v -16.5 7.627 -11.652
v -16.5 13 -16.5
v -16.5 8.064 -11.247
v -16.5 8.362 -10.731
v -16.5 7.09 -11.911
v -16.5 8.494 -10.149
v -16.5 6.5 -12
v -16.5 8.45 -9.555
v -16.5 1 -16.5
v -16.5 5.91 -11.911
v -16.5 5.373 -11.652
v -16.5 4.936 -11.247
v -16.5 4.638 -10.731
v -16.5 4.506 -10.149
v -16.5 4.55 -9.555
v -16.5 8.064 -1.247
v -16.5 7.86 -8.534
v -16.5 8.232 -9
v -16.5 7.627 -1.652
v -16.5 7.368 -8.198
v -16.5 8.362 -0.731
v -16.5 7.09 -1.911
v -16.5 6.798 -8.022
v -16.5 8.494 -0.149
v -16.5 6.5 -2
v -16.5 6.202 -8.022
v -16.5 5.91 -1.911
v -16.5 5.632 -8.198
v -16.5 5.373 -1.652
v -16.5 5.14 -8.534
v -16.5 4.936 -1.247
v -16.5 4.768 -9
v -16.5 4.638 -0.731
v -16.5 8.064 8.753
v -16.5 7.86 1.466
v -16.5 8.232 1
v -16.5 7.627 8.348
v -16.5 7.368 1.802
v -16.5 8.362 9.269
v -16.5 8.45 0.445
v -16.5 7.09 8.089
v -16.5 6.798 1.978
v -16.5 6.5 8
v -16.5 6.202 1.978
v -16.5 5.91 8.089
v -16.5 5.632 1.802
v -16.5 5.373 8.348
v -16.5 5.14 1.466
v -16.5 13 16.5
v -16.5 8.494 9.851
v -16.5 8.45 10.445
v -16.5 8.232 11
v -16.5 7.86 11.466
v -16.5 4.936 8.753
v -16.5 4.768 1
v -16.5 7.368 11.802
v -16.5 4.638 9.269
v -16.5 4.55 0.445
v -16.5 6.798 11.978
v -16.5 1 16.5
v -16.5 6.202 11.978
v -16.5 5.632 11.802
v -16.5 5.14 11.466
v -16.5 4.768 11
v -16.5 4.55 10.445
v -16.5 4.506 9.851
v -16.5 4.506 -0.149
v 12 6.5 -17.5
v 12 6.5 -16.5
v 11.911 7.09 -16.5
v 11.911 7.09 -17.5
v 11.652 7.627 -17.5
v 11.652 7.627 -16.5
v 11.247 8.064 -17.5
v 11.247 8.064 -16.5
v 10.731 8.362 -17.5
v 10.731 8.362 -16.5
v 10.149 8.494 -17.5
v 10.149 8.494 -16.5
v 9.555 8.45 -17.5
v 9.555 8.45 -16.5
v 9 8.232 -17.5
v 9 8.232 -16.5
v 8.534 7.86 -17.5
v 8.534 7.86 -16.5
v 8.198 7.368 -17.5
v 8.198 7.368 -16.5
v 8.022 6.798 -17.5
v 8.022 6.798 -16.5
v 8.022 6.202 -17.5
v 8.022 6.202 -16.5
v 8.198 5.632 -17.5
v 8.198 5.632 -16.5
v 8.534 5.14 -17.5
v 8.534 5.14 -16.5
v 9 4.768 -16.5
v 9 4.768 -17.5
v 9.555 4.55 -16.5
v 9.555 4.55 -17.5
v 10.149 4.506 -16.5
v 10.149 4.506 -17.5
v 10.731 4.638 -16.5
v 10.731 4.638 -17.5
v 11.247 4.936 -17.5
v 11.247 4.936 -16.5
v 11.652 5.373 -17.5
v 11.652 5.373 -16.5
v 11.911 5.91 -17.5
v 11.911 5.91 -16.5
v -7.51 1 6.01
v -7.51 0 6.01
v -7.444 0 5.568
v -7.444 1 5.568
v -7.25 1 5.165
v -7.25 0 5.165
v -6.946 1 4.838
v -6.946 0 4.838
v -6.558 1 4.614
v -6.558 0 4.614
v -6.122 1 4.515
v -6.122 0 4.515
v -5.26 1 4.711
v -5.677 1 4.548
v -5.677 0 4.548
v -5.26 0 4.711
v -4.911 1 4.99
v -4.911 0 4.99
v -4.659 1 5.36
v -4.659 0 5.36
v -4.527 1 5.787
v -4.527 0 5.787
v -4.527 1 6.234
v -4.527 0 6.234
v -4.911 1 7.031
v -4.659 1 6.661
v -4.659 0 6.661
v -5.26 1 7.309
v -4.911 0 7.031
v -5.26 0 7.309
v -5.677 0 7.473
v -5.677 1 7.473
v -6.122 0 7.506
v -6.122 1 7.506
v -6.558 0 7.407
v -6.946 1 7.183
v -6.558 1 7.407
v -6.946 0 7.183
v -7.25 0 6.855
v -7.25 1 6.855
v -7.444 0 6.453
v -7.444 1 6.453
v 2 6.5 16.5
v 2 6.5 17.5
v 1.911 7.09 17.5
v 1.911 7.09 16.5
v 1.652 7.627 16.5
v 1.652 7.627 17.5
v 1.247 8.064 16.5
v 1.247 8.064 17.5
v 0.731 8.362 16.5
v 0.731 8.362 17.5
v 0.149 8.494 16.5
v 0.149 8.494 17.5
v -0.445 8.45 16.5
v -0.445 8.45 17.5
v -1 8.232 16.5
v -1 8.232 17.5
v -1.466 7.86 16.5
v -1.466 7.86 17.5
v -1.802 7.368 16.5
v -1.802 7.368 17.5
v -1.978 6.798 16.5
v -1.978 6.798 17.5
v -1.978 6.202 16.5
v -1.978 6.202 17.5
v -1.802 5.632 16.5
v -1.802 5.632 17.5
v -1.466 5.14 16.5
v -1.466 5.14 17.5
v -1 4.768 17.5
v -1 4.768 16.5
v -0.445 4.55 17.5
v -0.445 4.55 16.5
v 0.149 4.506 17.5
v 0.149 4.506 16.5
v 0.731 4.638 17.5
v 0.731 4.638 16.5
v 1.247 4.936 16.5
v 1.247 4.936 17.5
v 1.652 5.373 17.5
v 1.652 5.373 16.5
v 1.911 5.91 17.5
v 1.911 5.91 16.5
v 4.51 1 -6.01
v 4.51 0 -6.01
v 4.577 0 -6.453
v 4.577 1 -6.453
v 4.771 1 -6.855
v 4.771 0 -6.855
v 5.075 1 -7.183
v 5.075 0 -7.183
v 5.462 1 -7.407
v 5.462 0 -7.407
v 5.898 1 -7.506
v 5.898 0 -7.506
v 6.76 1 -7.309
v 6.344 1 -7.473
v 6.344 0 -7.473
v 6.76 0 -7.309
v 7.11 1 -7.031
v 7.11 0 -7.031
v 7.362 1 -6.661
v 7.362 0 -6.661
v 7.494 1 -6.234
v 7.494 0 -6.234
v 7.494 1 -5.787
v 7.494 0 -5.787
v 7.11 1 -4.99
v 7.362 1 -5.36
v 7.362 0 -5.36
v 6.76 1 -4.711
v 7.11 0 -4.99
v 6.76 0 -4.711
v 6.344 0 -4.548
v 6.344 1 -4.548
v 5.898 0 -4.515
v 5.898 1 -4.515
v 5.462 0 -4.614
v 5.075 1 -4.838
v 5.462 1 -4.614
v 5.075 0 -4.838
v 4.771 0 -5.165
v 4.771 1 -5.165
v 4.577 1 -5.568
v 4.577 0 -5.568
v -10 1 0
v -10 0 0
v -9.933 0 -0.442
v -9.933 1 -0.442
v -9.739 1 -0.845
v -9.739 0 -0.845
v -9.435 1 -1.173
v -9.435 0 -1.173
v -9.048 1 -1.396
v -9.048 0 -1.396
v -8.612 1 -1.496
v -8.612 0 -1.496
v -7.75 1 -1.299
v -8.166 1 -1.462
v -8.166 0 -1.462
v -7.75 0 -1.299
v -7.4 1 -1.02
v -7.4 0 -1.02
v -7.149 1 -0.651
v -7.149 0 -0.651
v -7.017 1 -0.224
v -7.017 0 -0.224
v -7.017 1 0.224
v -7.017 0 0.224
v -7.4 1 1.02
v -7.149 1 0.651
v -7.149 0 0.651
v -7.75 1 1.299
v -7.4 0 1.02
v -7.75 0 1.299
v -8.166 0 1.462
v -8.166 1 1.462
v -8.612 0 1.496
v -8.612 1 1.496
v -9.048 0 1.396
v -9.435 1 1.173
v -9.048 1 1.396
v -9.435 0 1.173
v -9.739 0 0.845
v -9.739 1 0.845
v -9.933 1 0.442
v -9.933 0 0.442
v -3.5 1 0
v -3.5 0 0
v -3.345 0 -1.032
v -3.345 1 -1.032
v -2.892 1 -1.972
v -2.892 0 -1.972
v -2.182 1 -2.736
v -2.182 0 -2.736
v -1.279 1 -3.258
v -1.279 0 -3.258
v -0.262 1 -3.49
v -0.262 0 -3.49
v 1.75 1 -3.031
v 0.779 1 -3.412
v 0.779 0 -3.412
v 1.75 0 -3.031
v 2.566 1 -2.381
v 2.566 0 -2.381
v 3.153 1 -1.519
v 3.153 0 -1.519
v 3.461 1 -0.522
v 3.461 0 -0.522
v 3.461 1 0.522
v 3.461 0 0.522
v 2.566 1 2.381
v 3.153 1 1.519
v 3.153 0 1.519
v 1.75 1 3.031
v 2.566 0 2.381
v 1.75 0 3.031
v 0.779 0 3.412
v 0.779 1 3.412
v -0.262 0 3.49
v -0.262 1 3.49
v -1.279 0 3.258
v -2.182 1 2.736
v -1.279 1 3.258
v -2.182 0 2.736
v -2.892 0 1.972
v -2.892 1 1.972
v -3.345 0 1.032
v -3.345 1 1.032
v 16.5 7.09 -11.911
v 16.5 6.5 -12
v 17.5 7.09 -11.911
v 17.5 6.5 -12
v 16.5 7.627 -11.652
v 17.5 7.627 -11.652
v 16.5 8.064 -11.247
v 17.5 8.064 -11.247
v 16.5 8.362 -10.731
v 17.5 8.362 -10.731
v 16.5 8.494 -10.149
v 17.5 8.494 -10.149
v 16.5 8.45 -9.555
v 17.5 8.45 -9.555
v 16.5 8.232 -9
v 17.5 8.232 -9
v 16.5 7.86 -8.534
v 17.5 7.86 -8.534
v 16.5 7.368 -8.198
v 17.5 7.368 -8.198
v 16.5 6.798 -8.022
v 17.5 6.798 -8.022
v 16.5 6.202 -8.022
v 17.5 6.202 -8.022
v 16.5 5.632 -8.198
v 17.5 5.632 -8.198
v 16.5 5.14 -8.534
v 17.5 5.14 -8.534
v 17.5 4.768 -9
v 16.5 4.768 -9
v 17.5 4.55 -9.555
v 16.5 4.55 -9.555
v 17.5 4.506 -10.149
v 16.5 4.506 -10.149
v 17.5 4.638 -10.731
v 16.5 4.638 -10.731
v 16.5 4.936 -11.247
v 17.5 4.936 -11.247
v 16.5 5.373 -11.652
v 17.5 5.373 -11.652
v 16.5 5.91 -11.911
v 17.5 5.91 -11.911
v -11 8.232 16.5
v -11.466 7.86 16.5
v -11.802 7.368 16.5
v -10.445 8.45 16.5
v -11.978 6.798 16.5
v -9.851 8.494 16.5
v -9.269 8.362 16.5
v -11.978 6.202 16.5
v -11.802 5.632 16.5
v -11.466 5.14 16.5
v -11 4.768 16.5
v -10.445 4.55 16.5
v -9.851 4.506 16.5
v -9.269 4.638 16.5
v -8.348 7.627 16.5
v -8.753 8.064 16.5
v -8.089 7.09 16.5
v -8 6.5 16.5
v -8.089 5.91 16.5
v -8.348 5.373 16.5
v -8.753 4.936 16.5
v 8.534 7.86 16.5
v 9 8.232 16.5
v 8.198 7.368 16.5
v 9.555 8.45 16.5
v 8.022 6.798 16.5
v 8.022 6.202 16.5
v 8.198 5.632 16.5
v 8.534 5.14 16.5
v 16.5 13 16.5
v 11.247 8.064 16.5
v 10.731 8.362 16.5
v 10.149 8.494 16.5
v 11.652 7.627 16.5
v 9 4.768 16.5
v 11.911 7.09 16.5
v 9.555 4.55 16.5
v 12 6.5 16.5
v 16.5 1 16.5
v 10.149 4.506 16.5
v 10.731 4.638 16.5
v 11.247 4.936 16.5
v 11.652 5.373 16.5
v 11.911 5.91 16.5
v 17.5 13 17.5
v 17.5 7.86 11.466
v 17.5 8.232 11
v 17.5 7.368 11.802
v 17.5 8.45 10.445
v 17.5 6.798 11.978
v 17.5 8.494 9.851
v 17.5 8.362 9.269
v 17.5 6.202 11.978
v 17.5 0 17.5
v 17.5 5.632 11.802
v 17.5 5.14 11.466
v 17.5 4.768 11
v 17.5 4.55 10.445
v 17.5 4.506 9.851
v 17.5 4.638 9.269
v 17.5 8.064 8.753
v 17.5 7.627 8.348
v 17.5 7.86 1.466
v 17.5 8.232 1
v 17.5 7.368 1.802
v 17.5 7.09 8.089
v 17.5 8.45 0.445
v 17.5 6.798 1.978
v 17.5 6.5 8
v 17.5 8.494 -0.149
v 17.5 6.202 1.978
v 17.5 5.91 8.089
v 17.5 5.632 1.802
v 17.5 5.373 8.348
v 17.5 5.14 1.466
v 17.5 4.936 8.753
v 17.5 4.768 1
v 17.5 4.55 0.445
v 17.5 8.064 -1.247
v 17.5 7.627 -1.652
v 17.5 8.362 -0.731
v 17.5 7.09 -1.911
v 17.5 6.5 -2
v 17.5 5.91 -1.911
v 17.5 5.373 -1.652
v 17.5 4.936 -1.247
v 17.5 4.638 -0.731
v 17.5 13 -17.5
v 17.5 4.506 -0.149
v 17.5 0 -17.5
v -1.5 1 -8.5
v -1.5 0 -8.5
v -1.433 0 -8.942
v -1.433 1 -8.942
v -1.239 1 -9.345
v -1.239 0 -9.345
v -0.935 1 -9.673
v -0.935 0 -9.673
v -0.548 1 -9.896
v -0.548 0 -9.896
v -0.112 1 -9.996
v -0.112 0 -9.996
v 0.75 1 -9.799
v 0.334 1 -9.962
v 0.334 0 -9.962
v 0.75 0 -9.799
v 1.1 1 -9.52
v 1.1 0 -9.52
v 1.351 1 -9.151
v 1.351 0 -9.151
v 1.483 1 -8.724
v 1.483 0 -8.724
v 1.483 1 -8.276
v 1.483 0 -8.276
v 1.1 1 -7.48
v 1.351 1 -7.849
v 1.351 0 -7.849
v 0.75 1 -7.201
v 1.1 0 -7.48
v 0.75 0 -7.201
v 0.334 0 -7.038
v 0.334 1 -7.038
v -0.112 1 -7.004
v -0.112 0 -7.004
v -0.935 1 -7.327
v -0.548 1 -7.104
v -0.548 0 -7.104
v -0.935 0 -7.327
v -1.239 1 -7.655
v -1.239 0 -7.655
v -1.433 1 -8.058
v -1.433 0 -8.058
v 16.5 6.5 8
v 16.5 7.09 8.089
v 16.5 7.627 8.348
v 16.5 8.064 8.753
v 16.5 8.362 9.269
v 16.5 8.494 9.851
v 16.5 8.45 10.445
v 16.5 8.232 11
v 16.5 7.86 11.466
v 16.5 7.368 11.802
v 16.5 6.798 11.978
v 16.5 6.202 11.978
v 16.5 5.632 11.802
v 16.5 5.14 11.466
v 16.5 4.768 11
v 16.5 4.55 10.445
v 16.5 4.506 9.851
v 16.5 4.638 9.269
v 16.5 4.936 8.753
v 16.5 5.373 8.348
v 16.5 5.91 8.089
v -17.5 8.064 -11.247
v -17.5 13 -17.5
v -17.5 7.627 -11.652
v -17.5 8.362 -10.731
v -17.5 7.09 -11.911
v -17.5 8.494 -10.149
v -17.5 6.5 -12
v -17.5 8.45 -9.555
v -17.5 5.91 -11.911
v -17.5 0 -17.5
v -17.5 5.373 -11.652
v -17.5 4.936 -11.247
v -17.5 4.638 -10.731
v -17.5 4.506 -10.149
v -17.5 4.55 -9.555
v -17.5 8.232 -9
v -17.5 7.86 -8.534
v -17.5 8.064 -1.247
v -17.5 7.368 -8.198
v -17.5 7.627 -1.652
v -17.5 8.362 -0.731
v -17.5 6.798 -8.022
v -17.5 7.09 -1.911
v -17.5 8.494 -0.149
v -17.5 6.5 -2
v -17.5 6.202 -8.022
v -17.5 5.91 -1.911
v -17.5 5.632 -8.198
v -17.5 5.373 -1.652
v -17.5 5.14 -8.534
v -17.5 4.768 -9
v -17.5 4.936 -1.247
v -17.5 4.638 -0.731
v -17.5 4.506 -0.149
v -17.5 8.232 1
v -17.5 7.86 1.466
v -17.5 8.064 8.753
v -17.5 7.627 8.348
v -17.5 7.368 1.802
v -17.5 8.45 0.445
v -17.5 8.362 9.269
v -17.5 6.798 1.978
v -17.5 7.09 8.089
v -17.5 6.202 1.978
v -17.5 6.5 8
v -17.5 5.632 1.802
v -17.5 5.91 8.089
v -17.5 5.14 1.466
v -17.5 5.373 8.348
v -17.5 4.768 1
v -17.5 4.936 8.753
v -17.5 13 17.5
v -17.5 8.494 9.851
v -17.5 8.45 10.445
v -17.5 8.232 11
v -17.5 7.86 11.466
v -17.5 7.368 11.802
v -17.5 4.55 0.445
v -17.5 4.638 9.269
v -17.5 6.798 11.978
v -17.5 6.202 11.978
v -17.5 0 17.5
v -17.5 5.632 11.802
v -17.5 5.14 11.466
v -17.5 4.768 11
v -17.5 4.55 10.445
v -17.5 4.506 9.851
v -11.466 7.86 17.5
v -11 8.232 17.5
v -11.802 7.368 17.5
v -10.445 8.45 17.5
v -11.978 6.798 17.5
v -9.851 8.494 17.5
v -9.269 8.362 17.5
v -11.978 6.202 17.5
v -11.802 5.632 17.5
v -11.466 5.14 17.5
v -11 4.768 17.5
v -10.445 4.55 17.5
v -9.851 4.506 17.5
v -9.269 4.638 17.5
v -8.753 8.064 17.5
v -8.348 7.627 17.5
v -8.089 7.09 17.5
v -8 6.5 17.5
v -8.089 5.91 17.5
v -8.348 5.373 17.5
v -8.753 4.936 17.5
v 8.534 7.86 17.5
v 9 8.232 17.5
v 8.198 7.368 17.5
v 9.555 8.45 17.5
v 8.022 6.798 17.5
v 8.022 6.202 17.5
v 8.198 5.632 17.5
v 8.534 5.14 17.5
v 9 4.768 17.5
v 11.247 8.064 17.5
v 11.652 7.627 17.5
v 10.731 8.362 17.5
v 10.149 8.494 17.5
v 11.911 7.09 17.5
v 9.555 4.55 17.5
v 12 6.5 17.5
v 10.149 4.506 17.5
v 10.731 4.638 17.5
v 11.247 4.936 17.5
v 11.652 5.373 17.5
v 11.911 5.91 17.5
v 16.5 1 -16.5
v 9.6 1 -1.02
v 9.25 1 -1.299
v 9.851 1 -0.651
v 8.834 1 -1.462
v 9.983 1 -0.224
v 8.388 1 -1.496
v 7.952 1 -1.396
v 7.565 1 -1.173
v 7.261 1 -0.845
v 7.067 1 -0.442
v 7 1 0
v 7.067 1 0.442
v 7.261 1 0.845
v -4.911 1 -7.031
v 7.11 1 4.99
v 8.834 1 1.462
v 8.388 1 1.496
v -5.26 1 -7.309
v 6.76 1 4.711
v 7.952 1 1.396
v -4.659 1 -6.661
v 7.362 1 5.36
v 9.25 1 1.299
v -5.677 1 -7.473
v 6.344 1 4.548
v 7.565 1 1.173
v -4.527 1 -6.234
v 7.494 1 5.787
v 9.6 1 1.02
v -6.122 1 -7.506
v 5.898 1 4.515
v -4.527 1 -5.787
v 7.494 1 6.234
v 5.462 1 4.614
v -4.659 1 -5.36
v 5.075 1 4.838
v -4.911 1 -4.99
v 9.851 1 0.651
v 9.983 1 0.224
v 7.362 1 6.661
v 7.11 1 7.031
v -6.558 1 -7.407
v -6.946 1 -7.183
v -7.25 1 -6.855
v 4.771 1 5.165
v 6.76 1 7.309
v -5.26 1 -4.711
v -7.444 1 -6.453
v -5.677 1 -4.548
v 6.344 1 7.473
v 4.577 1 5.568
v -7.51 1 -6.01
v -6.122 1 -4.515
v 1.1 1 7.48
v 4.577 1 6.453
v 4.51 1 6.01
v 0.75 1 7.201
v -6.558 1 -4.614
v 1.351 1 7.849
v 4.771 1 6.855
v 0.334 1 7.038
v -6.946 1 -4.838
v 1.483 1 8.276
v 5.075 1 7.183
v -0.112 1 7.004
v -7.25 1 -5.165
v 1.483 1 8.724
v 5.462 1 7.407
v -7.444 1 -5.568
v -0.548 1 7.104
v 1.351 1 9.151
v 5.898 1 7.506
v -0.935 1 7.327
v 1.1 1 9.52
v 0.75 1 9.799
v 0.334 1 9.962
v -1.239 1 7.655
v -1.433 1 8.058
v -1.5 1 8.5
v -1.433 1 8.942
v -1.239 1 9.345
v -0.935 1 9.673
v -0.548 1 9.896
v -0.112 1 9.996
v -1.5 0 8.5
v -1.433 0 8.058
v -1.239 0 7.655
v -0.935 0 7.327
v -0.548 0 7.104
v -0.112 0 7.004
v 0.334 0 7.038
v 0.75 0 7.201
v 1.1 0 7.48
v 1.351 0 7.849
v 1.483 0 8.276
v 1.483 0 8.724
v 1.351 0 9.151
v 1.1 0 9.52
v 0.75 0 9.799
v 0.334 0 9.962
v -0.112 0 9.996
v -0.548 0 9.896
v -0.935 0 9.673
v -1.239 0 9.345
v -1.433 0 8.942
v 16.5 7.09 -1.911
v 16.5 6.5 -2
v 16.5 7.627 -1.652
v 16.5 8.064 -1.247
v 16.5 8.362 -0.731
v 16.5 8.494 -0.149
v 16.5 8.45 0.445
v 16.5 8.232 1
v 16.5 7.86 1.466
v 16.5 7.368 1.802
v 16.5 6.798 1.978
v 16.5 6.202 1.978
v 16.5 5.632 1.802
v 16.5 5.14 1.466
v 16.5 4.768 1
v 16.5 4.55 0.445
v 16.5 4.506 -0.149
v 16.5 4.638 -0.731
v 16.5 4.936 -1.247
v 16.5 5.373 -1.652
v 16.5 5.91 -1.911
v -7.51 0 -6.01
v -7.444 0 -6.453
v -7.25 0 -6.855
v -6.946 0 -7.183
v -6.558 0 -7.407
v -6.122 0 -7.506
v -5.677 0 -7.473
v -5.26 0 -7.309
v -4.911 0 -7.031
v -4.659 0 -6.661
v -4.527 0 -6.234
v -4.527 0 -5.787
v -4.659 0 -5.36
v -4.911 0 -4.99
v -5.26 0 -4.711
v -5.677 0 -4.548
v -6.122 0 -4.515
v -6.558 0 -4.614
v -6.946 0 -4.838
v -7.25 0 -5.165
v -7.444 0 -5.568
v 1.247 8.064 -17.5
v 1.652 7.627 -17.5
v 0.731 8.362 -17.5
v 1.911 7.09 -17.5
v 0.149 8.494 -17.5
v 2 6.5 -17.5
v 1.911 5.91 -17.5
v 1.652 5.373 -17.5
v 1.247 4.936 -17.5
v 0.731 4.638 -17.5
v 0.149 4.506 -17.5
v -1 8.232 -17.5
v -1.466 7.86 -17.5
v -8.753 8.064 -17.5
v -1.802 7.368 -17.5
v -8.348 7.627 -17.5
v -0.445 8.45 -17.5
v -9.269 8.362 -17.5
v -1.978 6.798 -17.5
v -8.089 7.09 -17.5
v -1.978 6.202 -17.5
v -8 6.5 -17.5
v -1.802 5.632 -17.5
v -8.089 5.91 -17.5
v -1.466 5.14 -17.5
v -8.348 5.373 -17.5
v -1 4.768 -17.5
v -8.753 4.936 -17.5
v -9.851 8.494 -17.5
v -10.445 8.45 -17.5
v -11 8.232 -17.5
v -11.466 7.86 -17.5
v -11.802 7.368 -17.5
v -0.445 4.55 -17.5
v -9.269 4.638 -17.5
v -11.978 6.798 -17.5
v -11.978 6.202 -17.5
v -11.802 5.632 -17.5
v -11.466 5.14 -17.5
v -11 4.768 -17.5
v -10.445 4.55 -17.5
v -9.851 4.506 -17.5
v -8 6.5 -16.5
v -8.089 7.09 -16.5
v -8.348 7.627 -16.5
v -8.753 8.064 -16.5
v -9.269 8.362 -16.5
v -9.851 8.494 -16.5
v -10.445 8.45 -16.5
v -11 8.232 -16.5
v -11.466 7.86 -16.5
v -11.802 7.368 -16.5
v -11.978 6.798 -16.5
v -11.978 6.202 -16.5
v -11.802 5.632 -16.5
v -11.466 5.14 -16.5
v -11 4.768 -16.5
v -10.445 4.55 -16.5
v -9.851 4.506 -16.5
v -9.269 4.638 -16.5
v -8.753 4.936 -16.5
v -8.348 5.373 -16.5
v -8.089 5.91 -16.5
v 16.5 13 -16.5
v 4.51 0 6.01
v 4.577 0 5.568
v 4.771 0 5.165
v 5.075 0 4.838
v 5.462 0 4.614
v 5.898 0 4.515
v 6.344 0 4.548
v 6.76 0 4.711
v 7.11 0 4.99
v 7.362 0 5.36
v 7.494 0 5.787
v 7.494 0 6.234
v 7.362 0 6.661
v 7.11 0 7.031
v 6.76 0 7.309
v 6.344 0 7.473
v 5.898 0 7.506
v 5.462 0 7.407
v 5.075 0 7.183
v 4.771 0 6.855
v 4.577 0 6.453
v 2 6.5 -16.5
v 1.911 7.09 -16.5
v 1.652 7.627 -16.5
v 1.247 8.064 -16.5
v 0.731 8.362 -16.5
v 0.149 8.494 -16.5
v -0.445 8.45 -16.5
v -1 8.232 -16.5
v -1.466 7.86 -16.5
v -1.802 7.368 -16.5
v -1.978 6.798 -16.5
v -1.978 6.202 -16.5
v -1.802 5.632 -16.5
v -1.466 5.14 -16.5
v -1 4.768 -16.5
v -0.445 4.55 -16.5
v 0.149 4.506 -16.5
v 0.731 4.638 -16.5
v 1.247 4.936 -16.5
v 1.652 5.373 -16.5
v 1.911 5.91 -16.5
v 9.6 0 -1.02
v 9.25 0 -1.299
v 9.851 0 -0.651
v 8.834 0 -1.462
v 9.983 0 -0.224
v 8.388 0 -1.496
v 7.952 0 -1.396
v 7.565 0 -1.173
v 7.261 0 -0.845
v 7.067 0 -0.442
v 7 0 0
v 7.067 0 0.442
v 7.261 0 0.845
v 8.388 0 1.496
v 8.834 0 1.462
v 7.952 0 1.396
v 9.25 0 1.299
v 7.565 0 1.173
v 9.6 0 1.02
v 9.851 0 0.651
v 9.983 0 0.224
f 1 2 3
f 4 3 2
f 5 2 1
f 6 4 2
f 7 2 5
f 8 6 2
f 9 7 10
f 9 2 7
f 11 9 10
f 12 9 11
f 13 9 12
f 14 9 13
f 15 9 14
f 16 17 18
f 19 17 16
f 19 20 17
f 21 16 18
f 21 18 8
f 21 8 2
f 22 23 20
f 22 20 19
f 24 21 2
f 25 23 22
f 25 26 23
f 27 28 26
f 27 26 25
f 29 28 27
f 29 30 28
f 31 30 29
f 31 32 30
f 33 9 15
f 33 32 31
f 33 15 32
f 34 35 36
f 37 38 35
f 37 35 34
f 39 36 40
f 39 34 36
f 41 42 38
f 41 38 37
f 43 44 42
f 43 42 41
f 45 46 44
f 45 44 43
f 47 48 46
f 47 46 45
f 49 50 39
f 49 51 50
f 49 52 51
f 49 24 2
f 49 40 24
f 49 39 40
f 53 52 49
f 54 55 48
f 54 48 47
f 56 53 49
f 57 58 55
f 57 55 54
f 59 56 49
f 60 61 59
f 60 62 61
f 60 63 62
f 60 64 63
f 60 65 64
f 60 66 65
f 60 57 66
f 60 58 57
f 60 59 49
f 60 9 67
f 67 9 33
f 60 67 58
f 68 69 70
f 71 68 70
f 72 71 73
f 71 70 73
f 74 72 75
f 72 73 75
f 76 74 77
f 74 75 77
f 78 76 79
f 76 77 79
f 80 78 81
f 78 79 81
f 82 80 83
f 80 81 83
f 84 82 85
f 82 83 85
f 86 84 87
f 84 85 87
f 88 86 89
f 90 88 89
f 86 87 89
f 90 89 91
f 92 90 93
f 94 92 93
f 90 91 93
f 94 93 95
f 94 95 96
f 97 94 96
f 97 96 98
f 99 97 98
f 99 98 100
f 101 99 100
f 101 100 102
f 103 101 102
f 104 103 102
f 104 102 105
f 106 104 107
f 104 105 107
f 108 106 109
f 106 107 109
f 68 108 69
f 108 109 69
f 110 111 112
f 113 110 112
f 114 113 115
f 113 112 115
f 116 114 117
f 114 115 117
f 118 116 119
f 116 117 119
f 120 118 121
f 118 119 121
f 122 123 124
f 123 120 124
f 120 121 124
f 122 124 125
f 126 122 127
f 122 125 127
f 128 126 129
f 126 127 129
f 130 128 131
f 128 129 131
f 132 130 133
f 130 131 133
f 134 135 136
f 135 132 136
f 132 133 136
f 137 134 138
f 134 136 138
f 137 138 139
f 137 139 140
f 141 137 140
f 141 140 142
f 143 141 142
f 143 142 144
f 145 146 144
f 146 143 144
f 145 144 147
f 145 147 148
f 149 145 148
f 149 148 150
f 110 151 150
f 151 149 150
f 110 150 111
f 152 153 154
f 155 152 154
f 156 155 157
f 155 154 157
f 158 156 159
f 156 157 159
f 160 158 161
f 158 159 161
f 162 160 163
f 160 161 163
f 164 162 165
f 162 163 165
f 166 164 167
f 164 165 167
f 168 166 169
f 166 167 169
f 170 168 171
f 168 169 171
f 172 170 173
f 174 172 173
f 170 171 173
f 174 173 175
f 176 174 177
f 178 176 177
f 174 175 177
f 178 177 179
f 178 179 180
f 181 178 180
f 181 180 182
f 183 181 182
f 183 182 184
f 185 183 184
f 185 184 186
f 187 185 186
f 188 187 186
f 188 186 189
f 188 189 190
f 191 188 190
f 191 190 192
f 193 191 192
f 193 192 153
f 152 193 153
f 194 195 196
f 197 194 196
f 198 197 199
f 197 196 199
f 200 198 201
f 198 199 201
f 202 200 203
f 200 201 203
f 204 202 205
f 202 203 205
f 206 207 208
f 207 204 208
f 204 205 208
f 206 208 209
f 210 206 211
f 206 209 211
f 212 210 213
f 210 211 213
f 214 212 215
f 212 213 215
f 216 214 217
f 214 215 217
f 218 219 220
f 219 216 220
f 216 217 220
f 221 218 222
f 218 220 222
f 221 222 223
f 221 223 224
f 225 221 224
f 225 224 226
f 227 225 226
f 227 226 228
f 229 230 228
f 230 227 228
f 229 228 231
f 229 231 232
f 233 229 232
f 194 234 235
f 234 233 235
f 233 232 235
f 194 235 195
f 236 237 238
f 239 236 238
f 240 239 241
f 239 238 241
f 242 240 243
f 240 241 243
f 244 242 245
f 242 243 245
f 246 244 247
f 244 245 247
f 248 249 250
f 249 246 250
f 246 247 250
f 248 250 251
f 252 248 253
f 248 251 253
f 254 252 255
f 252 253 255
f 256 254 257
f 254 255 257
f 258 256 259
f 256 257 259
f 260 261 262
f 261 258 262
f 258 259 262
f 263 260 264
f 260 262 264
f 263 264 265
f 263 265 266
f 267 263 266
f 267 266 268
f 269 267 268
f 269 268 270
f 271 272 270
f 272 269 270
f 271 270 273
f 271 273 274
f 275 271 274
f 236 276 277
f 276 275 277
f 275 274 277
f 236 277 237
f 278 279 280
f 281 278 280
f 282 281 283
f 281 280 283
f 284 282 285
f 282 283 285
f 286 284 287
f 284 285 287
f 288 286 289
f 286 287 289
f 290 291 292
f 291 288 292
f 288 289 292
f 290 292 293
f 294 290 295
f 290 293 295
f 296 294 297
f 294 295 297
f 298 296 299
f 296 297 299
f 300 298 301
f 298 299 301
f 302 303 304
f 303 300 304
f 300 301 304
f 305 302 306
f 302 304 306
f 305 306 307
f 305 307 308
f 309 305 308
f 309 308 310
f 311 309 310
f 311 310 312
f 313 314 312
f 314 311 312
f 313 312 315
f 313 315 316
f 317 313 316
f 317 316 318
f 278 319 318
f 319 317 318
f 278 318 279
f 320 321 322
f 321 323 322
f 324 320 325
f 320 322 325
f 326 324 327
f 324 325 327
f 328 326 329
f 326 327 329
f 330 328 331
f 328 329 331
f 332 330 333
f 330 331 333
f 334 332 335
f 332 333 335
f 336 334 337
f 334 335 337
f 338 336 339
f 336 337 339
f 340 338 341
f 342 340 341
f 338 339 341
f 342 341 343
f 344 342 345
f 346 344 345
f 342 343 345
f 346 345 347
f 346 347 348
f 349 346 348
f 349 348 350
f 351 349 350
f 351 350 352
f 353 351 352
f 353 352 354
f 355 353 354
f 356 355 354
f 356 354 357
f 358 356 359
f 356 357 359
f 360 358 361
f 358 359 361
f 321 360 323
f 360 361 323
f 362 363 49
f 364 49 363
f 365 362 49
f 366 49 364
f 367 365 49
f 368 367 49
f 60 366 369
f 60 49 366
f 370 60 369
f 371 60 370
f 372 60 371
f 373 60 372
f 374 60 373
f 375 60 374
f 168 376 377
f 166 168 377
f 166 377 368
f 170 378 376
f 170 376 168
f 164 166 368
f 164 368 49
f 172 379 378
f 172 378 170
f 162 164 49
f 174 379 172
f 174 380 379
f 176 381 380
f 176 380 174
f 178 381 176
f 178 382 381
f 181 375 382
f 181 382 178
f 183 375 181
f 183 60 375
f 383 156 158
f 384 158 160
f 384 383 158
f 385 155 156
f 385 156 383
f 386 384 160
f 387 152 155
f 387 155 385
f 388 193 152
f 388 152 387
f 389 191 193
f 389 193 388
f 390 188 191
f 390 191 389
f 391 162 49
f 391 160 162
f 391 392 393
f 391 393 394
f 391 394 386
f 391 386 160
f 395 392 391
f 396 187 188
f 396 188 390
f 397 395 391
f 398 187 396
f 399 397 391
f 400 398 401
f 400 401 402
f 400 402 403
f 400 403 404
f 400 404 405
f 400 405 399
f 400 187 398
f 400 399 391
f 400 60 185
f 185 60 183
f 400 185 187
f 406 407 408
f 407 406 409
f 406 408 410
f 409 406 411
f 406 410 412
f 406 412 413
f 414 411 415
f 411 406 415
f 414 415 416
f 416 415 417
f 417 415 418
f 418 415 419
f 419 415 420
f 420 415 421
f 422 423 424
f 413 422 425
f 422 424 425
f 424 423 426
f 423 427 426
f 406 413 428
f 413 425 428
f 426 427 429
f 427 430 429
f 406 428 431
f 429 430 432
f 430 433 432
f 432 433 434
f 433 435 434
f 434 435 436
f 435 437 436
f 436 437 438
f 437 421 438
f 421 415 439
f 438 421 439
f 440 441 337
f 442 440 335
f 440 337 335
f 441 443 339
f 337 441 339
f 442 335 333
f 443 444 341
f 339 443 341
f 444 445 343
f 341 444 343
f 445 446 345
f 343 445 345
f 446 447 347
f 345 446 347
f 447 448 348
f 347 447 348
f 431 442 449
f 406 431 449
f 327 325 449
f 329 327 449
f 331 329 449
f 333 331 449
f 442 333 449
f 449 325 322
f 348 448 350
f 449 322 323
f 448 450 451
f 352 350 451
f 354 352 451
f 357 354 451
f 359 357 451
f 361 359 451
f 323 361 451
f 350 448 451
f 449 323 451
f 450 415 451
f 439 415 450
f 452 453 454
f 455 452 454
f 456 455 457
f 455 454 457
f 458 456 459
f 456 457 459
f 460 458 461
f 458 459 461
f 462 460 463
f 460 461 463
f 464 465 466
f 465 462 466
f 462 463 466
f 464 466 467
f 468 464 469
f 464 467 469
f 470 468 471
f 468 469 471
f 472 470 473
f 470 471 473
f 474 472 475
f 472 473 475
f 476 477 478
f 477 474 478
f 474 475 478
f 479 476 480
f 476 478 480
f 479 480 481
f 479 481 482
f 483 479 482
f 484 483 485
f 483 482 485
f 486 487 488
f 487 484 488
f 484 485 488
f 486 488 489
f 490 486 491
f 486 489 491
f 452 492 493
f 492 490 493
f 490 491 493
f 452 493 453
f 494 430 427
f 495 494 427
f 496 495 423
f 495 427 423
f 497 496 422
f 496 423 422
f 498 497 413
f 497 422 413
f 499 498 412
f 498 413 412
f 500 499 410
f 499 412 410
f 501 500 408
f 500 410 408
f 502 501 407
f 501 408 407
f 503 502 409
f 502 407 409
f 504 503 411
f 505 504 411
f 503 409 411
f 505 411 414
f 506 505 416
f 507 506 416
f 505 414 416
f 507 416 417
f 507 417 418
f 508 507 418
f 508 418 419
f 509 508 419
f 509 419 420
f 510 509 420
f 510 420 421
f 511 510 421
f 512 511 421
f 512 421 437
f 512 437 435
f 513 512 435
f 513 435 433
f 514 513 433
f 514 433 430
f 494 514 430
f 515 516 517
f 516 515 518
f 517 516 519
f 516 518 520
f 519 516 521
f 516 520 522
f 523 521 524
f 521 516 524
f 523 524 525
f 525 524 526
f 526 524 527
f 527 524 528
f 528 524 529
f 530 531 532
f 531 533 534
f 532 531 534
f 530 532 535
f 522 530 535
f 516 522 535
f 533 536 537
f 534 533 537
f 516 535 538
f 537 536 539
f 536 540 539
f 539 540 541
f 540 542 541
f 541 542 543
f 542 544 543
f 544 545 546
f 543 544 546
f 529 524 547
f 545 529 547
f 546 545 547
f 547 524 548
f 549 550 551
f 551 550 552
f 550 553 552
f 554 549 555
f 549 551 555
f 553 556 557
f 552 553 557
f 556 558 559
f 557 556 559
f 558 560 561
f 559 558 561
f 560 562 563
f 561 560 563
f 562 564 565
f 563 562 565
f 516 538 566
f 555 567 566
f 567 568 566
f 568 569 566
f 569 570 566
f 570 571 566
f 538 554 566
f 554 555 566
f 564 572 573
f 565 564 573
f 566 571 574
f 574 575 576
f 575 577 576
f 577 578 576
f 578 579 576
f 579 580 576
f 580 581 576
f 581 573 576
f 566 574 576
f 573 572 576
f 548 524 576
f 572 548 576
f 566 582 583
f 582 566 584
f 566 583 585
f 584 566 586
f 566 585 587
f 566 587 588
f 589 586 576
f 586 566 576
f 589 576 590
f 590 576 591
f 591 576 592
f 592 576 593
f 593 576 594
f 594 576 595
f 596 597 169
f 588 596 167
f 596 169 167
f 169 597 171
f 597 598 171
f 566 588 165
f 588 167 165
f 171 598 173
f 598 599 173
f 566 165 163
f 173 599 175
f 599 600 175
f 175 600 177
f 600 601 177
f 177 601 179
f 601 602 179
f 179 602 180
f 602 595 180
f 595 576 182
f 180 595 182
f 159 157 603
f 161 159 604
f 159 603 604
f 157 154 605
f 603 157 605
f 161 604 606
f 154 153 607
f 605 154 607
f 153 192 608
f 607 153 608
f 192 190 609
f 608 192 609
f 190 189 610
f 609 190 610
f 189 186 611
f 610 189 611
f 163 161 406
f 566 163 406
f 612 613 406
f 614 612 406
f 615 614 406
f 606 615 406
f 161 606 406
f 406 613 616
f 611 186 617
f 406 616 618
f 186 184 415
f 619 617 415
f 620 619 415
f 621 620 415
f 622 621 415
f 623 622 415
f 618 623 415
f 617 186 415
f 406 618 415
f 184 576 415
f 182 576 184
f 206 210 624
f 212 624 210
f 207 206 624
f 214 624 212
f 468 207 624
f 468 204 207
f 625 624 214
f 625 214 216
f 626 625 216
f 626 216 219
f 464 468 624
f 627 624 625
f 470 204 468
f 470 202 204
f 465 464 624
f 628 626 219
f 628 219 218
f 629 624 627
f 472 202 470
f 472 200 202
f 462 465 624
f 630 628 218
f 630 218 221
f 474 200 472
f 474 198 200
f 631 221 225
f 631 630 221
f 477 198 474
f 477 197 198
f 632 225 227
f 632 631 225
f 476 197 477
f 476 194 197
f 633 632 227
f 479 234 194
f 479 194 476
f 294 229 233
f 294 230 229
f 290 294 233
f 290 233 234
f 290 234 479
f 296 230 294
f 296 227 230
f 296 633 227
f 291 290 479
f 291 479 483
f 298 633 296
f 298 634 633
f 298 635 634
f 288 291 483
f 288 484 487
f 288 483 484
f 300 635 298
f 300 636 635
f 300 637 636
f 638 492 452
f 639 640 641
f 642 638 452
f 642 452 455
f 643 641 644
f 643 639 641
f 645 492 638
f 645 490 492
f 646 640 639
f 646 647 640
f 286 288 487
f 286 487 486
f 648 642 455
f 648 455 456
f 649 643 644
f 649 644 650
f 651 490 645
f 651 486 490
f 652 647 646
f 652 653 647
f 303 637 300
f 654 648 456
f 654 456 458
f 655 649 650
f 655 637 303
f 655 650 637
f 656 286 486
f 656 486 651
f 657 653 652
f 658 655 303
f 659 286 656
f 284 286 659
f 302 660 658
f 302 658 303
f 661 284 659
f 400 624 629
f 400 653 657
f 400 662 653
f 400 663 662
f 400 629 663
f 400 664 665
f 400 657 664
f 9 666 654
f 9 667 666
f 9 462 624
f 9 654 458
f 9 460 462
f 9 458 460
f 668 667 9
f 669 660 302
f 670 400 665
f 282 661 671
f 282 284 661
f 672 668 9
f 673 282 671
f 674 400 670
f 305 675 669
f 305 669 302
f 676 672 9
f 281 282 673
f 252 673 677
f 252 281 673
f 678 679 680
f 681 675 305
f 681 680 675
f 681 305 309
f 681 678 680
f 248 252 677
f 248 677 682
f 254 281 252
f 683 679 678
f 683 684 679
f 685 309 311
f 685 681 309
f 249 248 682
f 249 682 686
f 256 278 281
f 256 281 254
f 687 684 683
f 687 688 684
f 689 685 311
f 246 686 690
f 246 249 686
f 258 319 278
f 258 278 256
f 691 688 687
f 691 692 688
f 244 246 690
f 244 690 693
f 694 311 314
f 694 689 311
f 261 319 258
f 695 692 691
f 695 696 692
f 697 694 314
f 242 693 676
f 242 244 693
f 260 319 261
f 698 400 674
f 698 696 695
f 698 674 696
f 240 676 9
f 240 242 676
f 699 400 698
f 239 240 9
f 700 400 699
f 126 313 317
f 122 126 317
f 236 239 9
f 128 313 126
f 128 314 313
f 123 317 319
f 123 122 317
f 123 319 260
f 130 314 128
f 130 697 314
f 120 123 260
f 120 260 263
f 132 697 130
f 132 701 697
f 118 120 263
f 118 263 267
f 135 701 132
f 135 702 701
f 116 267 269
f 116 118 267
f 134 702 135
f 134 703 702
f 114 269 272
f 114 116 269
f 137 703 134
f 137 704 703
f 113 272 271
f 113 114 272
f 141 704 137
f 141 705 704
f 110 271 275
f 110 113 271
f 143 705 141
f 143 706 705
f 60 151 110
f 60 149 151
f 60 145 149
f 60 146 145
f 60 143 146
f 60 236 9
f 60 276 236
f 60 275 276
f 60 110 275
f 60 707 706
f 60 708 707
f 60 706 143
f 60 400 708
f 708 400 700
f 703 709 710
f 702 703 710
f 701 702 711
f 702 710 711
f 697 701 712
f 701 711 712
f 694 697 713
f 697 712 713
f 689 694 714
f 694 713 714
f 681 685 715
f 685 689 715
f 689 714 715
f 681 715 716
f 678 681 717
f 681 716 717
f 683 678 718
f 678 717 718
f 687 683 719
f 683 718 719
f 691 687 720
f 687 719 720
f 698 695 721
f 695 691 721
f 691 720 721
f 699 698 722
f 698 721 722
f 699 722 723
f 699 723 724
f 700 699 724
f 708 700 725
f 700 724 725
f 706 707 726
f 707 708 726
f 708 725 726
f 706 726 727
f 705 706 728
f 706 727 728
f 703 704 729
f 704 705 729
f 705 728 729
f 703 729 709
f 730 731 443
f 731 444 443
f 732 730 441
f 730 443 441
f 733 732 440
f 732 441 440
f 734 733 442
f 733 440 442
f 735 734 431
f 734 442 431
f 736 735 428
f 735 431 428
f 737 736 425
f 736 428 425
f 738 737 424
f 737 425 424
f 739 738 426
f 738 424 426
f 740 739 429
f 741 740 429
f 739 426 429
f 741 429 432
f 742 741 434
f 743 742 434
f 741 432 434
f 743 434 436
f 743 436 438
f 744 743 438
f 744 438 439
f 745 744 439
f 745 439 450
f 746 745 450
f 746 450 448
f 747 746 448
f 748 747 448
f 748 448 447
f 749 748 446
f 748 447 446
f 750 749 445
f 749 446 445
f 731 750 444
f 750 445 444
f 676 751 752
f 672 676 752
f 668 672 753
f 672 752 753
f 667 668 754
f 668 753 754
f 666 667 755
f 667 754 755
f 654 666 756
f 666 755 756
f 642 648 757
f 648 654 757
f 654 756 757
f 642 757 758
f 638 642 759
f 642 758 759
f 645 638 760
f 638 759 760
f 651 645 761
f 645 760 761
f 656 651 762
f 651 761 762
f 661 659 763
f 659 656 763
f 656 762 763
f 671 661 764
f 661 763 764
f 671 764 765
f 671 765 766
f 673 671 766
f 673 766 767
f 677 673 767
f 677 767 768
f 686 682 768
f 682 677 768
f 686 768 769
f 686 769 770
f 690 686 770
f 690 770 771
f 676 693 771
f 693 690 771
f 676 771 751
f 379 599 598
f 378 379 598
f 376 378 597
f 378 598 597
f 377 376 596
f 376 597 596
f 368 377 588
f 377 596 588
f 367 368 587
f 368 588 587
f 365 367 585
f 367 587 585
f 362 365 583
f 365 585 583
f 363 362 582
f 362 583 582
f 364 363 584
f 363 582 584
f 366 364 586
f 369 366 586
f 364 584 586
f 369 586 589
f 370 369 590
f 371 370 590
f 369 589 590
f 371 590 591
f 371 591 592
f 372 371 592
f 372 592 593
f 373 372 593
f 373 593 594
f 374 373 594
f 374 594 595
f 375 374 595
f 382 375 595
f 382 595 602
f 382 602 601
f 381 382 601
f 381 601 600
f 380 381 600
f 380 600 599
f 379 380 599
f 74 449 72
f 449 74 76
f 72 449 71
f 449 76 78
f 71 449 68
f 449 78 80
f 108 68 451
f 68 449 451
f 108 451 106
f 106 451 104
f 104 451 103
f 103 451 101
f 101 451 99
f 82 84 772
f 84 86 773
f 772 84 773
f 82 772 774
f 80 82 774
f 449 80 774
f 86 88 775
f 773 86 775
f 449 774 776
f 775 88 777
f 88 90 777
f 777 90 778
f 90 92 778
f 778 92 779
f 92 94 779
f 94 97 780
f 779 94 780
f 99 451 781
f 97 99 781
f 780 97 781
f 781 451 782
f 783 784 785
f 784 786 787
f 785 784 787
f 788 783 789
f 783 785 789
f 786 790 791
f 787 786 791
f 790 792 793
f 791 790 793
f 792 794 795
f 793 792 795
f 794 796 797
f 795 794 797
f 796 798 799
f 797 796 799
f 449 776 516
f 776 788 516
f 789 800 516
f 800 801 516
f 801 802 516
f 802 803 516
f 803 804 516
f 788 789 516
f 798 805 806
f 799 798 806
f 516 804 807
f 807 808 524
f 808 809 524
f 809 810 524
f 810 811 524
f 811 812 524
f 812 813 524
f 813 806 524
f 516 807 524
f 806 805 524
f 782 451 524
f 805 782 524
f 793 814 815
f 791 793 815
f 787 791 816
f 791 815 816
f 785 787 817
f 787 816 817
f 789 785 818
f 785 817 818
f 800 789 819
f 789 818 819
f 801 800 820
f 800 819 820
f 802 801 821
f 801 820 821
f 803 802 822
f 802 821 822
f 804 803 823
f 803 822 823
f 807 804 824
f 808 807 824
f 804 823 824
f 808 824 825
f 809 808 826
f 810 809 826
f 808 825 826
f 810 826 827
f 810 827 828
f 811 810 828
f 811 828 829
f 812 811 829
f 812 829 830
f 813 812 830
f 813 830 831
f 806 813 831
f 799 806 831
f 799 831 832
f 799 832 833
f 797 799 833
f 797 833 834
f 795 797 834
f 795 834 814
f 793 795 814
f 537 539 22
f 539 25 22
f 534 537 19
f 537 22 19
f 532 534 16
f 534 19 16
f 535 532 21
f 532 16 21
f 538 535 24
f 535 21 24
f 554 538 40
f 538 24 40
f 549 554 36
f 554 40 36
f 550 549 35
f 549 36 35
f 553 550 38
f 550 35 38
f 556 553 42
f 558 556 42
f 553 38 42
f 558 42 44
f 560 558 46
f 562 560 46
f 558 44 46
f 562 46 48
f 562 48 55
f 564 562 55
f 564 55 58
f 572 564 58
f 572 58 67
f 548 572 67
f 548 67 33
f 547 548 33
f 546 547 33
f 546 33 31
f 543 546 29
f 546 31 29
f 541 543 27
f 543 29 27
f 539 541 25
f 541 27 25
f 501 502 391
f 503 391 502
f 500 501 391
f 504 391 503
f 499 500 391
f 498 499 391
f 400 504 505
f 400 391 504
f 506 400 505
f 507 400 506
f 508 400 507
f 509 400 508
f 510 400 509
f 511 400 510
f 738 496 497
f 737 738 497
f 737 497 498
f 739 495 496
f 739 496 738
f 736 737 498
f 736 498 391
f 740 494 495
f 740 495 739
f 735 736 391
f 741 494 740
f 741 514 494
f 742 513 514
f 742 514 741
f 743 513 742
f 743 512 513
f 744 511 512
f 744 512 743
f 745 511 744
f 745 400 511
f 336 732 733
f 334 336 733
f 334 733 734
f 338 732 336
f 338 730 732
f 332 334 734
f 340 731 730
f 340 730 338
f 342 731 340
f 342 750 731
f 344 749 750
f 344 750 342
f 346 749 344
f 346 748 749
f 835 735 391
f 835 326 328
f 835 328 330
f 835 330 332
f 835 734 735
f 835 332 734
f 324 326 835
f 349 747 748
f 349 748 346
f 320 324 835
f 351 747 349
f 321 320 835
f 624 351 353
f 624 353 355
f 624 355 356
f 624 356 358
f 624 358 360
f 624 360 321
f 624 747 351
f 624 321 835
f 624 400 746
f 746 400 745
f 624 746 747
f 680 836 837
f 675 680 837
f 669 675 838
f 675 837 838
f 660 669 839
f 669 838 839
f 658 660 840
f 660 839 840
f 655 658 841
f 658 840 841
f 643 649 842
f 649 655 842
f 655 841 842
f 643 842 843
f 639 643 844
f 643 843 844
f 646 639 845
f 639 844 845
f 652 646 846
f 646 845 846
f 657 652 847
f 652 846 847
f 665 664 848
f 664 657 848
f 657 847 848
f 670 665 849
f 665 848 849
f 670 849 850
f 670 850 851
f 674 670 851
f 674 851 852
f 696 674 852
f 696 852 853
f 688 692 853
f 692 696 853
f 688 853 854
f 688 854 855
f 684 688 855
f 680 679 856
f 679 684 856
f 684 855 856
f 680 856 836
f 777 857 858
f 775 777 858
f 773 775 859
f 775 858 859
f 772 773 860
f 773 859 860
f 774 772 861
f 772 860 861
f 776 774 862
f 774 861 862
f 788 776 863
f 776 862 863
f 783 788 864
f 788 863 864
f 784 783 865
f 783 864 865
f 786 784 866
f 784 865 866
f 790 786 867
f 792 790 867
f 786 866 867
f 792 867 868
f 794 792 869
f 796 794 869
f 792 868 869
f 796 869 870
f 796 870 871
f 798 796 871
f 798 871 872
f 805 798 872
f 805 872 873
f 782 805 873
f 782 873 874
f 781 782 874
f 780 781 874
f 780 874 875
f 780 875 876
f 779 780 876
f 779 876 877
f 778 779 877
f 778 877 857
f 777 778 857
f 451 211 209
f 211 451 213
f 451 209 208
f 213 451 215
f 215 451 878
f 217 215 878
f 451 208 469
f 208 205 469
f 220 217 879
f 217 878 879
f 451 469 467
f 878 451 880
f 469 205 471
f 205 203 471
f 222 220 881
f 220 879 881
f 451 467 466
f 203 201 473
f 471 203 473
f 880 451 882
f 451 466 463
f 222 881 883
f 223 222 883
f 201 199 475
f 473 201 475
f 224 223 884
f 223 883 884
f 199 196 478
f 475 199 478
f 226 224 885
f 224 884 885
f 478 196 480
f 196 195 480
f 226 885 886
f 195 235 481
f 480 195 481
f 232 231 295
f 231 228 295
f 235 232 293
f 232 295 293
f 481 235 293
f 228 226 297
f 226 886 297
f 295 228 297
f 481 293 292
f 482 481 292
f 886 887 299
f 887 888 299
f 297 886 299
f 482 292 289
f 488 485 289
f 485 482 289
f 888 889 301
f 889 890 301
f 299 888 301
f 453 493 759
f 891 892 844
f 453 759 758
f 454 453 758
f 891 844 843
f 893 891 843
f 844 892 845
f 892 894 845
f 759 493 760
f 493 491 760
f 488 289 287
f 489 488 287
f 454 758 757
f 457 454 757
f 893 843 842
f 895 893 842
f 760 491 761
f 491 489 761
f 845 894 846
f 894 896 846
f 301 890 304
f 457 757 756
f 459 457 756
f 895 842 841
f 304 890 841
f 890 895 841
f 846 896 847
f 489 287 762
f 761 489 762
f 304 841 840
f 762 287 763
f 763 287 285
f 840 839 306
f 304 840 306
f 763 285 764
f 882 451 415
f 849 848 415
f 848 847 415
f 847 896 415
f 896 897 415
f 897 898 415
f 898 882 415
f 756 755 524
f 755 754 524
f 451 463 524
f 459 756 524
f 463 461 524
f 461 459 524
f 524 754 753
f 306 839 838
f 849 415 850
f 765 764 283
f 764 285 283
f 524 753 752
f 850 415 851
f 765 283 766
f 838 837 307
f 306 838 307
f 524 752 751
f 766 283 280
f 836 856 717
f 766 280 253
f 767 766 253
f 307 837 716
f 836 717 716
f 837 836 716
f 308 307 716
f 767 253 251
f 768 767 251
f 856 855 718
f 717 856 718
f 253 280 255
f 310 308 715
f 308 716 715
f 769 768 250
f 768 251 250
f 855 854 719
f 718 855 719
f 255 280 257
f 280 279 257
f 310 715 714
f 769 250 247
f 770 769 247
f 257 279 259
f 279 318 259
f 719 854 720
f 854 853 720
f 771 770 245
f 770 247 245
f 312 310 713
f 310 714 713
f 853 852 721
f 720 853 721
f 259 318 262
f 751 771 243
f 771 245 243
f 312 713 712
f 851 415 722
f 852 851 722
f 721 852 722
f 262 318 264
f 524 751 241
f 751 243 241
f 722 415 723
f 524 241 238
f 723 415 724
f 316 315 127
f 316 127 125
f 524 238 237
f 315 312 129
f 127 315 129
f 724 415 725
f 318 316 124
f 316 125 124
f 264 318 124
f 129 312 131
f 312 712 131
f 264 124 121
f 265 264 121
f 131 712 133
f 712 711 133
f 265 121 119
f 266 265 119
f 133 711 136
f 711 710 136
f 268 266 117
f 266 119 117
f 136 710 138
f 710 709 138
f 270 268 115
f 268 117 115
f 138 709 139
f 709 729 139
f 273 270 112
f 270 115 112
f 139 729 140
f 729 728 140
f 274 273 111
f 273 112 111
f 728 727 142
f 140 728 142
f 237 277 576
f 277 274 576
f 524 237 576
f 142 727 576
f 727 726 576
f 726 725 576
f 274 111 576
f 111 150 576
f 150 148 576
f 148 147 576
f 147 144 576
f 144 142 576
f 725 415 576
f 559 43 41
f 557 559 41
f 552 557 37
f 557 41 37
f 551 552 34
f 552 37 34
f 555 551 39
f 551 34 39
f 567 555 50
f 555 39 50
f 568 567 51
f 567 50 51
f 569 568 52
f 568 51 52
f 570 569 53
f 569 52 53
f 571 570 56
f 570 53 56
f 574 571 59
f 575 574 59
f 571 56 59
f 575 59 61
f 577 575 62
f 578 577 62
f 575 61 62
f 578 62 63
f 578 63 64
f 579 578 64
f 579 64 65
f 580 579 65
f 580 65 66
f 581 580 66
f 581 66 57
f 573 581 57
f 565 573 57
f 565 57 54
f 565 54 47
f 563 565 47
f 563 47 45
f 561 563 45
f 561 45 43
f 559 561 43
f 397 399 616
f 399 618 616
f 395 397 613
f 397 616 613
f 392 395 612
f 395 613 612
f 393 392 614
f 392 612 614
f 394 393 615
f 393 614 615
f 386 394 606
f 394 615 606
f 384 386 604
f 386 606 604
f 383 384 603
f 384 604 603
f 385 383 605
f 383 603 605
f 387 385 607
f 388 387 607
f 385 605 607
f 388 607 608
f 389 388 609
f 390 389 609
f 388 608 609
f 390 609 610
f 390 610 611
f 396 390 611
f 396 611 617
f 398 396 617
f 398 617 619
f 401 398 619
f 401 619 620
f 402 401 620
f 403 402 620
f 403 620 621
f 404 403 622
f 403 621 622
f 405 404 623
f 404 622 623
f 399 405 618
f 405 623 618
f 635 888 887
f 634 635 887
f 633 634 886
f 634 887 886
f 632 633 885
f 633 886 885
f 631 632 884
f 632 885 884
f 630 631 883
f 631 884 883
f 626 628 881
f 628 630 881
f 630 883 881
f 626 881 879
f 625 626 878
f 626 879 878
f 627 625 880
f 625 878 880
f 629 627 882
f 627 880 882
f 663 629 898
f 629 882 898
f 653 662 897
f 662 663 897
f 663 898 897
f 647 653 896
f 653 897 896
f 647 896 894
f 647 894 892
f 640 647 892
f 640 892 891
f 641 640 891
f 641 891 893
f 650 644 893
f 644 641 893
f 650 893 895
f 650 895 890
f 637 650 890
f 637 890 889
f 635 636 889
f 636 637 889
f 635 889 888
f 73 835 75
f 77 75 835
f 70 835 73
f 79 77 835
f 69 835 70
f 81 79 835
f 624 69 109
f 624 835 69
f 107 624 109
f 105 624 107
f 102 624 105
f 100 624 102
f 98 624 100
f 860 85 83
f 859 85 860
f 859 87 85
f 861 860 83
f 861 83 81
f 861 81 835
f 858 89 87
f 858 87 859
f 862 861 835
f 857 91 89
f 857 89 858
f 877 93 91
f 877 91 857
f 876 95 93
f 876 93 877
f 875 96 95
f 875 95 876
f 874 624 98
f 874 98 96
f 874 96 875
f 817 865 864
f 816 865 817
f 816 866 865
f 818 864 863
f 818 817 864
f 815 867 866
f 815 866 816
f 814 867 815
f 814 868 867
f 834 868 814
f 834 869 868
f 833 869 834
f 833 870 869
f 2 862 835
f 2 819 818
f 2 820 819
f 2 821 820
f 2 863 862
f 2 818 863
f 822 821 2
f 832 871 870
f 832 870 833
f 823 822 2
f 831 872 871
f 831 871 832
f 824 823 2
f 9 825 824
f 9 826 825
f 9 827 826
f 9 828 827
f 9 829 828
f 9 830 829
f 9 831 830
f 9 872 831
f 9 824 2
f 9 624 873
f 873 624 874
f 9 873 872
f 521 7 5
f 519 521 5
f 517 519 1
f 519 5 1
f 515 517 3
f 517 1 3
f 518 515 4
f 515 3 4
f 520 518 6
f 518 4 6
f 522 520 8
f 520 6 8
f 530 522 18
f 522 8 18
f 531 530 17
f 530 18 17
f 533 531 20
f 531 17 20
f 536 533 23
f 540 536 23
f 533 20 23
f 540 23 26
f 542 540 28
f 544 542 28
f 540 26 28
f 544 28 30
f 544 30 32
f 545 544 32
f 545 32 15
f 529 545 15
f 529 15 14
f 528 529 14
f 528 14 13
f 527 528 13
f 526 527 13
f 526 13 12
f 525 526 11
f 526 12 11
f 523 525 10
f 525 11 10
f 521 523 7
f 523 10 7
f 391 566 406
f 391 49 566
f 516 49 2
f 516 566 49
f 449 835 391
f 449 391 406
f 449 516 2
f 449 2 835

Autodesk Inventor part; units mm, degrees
ref_plane "YZ Plane" through (0, 0, 0) normal (1, 0, 0) x (0, 1, 0)
ref_plane "XZ Plane" through (0, 0, 0) normal (0, 1, 0) x (-1, 0, 0)
ref_plane "XY Plane" through (0, 0, 0) normal (0, 0, 1) x (1, 0, 0)
sketch "Эскиз1" plane through (0, 0, 0) normal (0, 1, 0) x (-1, 0, 0)
  circle A0 centre (0, 0) radius 3.5
  circle A1 centre (0, -8.5) radius 1.5
  circle A2 centre (6.0104, -6.0104) radius 1.5
  circle A3 centre (8.5, 0) radius 1.5
  circle A4 centre (6.0104, 6.0104) radius 1.5
  circle A5 centre (0, 8.5) radius 1.5
  circle A6 centre (-6.0104, 6.0104) radius 1.5
  circle A7 centre (-8.5, 0) radius 1.5
  circle A8 centre (-6.0104, -6.0104) radius 1.5
  line L0 (17.5, 17.5) -> (-17.5, 17.5)
  line L1 (-17.5, 17.5) -> (-17.5, -17.5)
  line L2 (-17.5, -17.5) -> (17.5, -17.5)
  line L3 (17.5, -17.5) -> (17.5, 17.5)
  dimension "d0" = 7
  dimension "d1" = 3
  dimension "d2" = 8.5
  dimension "d5" = 360
  dimension "d7" = 35
  dimension "d8" = 17.5
  dimension "d9" = 35
  dimension "d10" = 17.5
extrude "Выдавливание1" add sketch "Эскиз1" along normal blind 1
sketch "Эскиз2" plane through (0, 1, 0) normal (0, 1, 0) x (1, 0, 0)
  circle A0 centre (0, 0) radius 3.5 projected
  circle A1 centre (6.0104, 6.0104) radius 1.5 projected
  circle A2 centre (8.5, 0) radius 1.5 projected
  circle A3 centre (6.0104, -6.0104) radius 1.5 projected
  circle A4 centre (0, -8.5) radius 1.5 projected
  circle A5 centre (-6.0104, -6.0104) radius 1.5 projected
  circle A6 centre (-8.5, 0) radius 1.5 projected
  circle A7 centre (-6.0104, 6.0104) radius 1.5 projected
  circle A8 centre (0, 8.5) radius 1.5 projected
  line L0 (-17.5, -17.5) -> (17.5, -17.5) projected
  line L1 (17.5, -17.5) -> (17.5, 17.5) projected
  line L2 (17.5, 17.5) -> (-17.5, 17.5) projected
  line L3 (-17.5, 17.5) -> (-17.5, -17.5) projected
  line L4 (-16.5, -16.5) -> (16.5, -16.5)
  line L5 (16.5, -16.5) -> (16.5, 16.5)
  line L6 (16.5, 16.5) -> (-16.5, 16.5)
  line L7 (-16.5, 16.5) -> (-16.5, -16.5)
  dimension "d13" = 1
  dimension "d14" = 1
  dimension "d15" = 1
  dimension "d16" = 1
extrude "Выдавливание2" add sketch "Эскиз2" along normal blind 12 contours L3 L2 L1 L0
sketch "Эскиз3" plane through (17.5, 0, 17.5) normal (1, 0, 0) x (0, 0, -1)
  circle A0 centre (17.5, 6.5) radius 2
  line L0 (0, 0) -> (0, 13) projected
  line L1 (35, 0) -> (35, 13) projected
  line L2 (0, 0) -> (35, 0) projected
  line L3 (0, 13) -> (35, 13) projected
  circle A1 centre (27.5, 6.5) radius 2
  circle A2 centre (7.5, 6.5) radius 2
  point P0 (17.5, 0)
  dimension "d19" = 4
  dimension "d20" = 35
  dimension "d21" = 17.5
  dimension "d22" = 13
  dimension "d23" = 6.5
  dimension "d24" = 4
  dimension "d25" = 10
  dimension "d26" = 4
  dimension "d27" = 10
extrude "Выдавливание3" cut sketch "Эскиз3" against normal blind 40 contours A0 | A1 | A2
sketch "Эскиз4" plane through (-17.5, 0, 17.5) normal (0, 0, 1) x (1, 0, 0)
  circle A0 centre (17.5, 6.5) radius 2
  line L0 (35, 0) -> (35, 13) projected
  line L1 (0, 0) -> (0, 13) projected
  line L2 (0, 0) -> (35, 0) projected
  line L3 (0, 13) -> (35, 13) projected
  circle A1 centre (27.5, 6.5) radius 2
  circle A2 centre (7.5, 6.5) radius 2
  point P0 (17.5, 0)
  dimension "d30" = 4
  dimension "d31" = 35
  dimension "d32" = 13
  dimension "d33" = 6.5
  dimension "d34" = 17.5
  dimension "d35" = 4
  dimension "d36" = 10
  dimension "d39" = 360
extrude "Выдавливание4" cut sketch "Эскиз4" against normal blind 40 contours A0 | A1 | A2
equation "\"d8\" = 0.5 * d7"
equation "\"d9\" = d7"
equation "\"d10\" = 0.5 * d9"
equation "\"d14\" = d13"
equation "\"d15\" = d13"
equation "\"d16\" = d13"
equation "\"d21\" = 0.5 * d20"
equation "\"d23\" = 0.5 * d22"
equation "\"d33\" = 0.5 * d32"
equation "\"d34\" = 0.5 * d31"
properties part number "01_Крепление_мотора" material "Сталь"
